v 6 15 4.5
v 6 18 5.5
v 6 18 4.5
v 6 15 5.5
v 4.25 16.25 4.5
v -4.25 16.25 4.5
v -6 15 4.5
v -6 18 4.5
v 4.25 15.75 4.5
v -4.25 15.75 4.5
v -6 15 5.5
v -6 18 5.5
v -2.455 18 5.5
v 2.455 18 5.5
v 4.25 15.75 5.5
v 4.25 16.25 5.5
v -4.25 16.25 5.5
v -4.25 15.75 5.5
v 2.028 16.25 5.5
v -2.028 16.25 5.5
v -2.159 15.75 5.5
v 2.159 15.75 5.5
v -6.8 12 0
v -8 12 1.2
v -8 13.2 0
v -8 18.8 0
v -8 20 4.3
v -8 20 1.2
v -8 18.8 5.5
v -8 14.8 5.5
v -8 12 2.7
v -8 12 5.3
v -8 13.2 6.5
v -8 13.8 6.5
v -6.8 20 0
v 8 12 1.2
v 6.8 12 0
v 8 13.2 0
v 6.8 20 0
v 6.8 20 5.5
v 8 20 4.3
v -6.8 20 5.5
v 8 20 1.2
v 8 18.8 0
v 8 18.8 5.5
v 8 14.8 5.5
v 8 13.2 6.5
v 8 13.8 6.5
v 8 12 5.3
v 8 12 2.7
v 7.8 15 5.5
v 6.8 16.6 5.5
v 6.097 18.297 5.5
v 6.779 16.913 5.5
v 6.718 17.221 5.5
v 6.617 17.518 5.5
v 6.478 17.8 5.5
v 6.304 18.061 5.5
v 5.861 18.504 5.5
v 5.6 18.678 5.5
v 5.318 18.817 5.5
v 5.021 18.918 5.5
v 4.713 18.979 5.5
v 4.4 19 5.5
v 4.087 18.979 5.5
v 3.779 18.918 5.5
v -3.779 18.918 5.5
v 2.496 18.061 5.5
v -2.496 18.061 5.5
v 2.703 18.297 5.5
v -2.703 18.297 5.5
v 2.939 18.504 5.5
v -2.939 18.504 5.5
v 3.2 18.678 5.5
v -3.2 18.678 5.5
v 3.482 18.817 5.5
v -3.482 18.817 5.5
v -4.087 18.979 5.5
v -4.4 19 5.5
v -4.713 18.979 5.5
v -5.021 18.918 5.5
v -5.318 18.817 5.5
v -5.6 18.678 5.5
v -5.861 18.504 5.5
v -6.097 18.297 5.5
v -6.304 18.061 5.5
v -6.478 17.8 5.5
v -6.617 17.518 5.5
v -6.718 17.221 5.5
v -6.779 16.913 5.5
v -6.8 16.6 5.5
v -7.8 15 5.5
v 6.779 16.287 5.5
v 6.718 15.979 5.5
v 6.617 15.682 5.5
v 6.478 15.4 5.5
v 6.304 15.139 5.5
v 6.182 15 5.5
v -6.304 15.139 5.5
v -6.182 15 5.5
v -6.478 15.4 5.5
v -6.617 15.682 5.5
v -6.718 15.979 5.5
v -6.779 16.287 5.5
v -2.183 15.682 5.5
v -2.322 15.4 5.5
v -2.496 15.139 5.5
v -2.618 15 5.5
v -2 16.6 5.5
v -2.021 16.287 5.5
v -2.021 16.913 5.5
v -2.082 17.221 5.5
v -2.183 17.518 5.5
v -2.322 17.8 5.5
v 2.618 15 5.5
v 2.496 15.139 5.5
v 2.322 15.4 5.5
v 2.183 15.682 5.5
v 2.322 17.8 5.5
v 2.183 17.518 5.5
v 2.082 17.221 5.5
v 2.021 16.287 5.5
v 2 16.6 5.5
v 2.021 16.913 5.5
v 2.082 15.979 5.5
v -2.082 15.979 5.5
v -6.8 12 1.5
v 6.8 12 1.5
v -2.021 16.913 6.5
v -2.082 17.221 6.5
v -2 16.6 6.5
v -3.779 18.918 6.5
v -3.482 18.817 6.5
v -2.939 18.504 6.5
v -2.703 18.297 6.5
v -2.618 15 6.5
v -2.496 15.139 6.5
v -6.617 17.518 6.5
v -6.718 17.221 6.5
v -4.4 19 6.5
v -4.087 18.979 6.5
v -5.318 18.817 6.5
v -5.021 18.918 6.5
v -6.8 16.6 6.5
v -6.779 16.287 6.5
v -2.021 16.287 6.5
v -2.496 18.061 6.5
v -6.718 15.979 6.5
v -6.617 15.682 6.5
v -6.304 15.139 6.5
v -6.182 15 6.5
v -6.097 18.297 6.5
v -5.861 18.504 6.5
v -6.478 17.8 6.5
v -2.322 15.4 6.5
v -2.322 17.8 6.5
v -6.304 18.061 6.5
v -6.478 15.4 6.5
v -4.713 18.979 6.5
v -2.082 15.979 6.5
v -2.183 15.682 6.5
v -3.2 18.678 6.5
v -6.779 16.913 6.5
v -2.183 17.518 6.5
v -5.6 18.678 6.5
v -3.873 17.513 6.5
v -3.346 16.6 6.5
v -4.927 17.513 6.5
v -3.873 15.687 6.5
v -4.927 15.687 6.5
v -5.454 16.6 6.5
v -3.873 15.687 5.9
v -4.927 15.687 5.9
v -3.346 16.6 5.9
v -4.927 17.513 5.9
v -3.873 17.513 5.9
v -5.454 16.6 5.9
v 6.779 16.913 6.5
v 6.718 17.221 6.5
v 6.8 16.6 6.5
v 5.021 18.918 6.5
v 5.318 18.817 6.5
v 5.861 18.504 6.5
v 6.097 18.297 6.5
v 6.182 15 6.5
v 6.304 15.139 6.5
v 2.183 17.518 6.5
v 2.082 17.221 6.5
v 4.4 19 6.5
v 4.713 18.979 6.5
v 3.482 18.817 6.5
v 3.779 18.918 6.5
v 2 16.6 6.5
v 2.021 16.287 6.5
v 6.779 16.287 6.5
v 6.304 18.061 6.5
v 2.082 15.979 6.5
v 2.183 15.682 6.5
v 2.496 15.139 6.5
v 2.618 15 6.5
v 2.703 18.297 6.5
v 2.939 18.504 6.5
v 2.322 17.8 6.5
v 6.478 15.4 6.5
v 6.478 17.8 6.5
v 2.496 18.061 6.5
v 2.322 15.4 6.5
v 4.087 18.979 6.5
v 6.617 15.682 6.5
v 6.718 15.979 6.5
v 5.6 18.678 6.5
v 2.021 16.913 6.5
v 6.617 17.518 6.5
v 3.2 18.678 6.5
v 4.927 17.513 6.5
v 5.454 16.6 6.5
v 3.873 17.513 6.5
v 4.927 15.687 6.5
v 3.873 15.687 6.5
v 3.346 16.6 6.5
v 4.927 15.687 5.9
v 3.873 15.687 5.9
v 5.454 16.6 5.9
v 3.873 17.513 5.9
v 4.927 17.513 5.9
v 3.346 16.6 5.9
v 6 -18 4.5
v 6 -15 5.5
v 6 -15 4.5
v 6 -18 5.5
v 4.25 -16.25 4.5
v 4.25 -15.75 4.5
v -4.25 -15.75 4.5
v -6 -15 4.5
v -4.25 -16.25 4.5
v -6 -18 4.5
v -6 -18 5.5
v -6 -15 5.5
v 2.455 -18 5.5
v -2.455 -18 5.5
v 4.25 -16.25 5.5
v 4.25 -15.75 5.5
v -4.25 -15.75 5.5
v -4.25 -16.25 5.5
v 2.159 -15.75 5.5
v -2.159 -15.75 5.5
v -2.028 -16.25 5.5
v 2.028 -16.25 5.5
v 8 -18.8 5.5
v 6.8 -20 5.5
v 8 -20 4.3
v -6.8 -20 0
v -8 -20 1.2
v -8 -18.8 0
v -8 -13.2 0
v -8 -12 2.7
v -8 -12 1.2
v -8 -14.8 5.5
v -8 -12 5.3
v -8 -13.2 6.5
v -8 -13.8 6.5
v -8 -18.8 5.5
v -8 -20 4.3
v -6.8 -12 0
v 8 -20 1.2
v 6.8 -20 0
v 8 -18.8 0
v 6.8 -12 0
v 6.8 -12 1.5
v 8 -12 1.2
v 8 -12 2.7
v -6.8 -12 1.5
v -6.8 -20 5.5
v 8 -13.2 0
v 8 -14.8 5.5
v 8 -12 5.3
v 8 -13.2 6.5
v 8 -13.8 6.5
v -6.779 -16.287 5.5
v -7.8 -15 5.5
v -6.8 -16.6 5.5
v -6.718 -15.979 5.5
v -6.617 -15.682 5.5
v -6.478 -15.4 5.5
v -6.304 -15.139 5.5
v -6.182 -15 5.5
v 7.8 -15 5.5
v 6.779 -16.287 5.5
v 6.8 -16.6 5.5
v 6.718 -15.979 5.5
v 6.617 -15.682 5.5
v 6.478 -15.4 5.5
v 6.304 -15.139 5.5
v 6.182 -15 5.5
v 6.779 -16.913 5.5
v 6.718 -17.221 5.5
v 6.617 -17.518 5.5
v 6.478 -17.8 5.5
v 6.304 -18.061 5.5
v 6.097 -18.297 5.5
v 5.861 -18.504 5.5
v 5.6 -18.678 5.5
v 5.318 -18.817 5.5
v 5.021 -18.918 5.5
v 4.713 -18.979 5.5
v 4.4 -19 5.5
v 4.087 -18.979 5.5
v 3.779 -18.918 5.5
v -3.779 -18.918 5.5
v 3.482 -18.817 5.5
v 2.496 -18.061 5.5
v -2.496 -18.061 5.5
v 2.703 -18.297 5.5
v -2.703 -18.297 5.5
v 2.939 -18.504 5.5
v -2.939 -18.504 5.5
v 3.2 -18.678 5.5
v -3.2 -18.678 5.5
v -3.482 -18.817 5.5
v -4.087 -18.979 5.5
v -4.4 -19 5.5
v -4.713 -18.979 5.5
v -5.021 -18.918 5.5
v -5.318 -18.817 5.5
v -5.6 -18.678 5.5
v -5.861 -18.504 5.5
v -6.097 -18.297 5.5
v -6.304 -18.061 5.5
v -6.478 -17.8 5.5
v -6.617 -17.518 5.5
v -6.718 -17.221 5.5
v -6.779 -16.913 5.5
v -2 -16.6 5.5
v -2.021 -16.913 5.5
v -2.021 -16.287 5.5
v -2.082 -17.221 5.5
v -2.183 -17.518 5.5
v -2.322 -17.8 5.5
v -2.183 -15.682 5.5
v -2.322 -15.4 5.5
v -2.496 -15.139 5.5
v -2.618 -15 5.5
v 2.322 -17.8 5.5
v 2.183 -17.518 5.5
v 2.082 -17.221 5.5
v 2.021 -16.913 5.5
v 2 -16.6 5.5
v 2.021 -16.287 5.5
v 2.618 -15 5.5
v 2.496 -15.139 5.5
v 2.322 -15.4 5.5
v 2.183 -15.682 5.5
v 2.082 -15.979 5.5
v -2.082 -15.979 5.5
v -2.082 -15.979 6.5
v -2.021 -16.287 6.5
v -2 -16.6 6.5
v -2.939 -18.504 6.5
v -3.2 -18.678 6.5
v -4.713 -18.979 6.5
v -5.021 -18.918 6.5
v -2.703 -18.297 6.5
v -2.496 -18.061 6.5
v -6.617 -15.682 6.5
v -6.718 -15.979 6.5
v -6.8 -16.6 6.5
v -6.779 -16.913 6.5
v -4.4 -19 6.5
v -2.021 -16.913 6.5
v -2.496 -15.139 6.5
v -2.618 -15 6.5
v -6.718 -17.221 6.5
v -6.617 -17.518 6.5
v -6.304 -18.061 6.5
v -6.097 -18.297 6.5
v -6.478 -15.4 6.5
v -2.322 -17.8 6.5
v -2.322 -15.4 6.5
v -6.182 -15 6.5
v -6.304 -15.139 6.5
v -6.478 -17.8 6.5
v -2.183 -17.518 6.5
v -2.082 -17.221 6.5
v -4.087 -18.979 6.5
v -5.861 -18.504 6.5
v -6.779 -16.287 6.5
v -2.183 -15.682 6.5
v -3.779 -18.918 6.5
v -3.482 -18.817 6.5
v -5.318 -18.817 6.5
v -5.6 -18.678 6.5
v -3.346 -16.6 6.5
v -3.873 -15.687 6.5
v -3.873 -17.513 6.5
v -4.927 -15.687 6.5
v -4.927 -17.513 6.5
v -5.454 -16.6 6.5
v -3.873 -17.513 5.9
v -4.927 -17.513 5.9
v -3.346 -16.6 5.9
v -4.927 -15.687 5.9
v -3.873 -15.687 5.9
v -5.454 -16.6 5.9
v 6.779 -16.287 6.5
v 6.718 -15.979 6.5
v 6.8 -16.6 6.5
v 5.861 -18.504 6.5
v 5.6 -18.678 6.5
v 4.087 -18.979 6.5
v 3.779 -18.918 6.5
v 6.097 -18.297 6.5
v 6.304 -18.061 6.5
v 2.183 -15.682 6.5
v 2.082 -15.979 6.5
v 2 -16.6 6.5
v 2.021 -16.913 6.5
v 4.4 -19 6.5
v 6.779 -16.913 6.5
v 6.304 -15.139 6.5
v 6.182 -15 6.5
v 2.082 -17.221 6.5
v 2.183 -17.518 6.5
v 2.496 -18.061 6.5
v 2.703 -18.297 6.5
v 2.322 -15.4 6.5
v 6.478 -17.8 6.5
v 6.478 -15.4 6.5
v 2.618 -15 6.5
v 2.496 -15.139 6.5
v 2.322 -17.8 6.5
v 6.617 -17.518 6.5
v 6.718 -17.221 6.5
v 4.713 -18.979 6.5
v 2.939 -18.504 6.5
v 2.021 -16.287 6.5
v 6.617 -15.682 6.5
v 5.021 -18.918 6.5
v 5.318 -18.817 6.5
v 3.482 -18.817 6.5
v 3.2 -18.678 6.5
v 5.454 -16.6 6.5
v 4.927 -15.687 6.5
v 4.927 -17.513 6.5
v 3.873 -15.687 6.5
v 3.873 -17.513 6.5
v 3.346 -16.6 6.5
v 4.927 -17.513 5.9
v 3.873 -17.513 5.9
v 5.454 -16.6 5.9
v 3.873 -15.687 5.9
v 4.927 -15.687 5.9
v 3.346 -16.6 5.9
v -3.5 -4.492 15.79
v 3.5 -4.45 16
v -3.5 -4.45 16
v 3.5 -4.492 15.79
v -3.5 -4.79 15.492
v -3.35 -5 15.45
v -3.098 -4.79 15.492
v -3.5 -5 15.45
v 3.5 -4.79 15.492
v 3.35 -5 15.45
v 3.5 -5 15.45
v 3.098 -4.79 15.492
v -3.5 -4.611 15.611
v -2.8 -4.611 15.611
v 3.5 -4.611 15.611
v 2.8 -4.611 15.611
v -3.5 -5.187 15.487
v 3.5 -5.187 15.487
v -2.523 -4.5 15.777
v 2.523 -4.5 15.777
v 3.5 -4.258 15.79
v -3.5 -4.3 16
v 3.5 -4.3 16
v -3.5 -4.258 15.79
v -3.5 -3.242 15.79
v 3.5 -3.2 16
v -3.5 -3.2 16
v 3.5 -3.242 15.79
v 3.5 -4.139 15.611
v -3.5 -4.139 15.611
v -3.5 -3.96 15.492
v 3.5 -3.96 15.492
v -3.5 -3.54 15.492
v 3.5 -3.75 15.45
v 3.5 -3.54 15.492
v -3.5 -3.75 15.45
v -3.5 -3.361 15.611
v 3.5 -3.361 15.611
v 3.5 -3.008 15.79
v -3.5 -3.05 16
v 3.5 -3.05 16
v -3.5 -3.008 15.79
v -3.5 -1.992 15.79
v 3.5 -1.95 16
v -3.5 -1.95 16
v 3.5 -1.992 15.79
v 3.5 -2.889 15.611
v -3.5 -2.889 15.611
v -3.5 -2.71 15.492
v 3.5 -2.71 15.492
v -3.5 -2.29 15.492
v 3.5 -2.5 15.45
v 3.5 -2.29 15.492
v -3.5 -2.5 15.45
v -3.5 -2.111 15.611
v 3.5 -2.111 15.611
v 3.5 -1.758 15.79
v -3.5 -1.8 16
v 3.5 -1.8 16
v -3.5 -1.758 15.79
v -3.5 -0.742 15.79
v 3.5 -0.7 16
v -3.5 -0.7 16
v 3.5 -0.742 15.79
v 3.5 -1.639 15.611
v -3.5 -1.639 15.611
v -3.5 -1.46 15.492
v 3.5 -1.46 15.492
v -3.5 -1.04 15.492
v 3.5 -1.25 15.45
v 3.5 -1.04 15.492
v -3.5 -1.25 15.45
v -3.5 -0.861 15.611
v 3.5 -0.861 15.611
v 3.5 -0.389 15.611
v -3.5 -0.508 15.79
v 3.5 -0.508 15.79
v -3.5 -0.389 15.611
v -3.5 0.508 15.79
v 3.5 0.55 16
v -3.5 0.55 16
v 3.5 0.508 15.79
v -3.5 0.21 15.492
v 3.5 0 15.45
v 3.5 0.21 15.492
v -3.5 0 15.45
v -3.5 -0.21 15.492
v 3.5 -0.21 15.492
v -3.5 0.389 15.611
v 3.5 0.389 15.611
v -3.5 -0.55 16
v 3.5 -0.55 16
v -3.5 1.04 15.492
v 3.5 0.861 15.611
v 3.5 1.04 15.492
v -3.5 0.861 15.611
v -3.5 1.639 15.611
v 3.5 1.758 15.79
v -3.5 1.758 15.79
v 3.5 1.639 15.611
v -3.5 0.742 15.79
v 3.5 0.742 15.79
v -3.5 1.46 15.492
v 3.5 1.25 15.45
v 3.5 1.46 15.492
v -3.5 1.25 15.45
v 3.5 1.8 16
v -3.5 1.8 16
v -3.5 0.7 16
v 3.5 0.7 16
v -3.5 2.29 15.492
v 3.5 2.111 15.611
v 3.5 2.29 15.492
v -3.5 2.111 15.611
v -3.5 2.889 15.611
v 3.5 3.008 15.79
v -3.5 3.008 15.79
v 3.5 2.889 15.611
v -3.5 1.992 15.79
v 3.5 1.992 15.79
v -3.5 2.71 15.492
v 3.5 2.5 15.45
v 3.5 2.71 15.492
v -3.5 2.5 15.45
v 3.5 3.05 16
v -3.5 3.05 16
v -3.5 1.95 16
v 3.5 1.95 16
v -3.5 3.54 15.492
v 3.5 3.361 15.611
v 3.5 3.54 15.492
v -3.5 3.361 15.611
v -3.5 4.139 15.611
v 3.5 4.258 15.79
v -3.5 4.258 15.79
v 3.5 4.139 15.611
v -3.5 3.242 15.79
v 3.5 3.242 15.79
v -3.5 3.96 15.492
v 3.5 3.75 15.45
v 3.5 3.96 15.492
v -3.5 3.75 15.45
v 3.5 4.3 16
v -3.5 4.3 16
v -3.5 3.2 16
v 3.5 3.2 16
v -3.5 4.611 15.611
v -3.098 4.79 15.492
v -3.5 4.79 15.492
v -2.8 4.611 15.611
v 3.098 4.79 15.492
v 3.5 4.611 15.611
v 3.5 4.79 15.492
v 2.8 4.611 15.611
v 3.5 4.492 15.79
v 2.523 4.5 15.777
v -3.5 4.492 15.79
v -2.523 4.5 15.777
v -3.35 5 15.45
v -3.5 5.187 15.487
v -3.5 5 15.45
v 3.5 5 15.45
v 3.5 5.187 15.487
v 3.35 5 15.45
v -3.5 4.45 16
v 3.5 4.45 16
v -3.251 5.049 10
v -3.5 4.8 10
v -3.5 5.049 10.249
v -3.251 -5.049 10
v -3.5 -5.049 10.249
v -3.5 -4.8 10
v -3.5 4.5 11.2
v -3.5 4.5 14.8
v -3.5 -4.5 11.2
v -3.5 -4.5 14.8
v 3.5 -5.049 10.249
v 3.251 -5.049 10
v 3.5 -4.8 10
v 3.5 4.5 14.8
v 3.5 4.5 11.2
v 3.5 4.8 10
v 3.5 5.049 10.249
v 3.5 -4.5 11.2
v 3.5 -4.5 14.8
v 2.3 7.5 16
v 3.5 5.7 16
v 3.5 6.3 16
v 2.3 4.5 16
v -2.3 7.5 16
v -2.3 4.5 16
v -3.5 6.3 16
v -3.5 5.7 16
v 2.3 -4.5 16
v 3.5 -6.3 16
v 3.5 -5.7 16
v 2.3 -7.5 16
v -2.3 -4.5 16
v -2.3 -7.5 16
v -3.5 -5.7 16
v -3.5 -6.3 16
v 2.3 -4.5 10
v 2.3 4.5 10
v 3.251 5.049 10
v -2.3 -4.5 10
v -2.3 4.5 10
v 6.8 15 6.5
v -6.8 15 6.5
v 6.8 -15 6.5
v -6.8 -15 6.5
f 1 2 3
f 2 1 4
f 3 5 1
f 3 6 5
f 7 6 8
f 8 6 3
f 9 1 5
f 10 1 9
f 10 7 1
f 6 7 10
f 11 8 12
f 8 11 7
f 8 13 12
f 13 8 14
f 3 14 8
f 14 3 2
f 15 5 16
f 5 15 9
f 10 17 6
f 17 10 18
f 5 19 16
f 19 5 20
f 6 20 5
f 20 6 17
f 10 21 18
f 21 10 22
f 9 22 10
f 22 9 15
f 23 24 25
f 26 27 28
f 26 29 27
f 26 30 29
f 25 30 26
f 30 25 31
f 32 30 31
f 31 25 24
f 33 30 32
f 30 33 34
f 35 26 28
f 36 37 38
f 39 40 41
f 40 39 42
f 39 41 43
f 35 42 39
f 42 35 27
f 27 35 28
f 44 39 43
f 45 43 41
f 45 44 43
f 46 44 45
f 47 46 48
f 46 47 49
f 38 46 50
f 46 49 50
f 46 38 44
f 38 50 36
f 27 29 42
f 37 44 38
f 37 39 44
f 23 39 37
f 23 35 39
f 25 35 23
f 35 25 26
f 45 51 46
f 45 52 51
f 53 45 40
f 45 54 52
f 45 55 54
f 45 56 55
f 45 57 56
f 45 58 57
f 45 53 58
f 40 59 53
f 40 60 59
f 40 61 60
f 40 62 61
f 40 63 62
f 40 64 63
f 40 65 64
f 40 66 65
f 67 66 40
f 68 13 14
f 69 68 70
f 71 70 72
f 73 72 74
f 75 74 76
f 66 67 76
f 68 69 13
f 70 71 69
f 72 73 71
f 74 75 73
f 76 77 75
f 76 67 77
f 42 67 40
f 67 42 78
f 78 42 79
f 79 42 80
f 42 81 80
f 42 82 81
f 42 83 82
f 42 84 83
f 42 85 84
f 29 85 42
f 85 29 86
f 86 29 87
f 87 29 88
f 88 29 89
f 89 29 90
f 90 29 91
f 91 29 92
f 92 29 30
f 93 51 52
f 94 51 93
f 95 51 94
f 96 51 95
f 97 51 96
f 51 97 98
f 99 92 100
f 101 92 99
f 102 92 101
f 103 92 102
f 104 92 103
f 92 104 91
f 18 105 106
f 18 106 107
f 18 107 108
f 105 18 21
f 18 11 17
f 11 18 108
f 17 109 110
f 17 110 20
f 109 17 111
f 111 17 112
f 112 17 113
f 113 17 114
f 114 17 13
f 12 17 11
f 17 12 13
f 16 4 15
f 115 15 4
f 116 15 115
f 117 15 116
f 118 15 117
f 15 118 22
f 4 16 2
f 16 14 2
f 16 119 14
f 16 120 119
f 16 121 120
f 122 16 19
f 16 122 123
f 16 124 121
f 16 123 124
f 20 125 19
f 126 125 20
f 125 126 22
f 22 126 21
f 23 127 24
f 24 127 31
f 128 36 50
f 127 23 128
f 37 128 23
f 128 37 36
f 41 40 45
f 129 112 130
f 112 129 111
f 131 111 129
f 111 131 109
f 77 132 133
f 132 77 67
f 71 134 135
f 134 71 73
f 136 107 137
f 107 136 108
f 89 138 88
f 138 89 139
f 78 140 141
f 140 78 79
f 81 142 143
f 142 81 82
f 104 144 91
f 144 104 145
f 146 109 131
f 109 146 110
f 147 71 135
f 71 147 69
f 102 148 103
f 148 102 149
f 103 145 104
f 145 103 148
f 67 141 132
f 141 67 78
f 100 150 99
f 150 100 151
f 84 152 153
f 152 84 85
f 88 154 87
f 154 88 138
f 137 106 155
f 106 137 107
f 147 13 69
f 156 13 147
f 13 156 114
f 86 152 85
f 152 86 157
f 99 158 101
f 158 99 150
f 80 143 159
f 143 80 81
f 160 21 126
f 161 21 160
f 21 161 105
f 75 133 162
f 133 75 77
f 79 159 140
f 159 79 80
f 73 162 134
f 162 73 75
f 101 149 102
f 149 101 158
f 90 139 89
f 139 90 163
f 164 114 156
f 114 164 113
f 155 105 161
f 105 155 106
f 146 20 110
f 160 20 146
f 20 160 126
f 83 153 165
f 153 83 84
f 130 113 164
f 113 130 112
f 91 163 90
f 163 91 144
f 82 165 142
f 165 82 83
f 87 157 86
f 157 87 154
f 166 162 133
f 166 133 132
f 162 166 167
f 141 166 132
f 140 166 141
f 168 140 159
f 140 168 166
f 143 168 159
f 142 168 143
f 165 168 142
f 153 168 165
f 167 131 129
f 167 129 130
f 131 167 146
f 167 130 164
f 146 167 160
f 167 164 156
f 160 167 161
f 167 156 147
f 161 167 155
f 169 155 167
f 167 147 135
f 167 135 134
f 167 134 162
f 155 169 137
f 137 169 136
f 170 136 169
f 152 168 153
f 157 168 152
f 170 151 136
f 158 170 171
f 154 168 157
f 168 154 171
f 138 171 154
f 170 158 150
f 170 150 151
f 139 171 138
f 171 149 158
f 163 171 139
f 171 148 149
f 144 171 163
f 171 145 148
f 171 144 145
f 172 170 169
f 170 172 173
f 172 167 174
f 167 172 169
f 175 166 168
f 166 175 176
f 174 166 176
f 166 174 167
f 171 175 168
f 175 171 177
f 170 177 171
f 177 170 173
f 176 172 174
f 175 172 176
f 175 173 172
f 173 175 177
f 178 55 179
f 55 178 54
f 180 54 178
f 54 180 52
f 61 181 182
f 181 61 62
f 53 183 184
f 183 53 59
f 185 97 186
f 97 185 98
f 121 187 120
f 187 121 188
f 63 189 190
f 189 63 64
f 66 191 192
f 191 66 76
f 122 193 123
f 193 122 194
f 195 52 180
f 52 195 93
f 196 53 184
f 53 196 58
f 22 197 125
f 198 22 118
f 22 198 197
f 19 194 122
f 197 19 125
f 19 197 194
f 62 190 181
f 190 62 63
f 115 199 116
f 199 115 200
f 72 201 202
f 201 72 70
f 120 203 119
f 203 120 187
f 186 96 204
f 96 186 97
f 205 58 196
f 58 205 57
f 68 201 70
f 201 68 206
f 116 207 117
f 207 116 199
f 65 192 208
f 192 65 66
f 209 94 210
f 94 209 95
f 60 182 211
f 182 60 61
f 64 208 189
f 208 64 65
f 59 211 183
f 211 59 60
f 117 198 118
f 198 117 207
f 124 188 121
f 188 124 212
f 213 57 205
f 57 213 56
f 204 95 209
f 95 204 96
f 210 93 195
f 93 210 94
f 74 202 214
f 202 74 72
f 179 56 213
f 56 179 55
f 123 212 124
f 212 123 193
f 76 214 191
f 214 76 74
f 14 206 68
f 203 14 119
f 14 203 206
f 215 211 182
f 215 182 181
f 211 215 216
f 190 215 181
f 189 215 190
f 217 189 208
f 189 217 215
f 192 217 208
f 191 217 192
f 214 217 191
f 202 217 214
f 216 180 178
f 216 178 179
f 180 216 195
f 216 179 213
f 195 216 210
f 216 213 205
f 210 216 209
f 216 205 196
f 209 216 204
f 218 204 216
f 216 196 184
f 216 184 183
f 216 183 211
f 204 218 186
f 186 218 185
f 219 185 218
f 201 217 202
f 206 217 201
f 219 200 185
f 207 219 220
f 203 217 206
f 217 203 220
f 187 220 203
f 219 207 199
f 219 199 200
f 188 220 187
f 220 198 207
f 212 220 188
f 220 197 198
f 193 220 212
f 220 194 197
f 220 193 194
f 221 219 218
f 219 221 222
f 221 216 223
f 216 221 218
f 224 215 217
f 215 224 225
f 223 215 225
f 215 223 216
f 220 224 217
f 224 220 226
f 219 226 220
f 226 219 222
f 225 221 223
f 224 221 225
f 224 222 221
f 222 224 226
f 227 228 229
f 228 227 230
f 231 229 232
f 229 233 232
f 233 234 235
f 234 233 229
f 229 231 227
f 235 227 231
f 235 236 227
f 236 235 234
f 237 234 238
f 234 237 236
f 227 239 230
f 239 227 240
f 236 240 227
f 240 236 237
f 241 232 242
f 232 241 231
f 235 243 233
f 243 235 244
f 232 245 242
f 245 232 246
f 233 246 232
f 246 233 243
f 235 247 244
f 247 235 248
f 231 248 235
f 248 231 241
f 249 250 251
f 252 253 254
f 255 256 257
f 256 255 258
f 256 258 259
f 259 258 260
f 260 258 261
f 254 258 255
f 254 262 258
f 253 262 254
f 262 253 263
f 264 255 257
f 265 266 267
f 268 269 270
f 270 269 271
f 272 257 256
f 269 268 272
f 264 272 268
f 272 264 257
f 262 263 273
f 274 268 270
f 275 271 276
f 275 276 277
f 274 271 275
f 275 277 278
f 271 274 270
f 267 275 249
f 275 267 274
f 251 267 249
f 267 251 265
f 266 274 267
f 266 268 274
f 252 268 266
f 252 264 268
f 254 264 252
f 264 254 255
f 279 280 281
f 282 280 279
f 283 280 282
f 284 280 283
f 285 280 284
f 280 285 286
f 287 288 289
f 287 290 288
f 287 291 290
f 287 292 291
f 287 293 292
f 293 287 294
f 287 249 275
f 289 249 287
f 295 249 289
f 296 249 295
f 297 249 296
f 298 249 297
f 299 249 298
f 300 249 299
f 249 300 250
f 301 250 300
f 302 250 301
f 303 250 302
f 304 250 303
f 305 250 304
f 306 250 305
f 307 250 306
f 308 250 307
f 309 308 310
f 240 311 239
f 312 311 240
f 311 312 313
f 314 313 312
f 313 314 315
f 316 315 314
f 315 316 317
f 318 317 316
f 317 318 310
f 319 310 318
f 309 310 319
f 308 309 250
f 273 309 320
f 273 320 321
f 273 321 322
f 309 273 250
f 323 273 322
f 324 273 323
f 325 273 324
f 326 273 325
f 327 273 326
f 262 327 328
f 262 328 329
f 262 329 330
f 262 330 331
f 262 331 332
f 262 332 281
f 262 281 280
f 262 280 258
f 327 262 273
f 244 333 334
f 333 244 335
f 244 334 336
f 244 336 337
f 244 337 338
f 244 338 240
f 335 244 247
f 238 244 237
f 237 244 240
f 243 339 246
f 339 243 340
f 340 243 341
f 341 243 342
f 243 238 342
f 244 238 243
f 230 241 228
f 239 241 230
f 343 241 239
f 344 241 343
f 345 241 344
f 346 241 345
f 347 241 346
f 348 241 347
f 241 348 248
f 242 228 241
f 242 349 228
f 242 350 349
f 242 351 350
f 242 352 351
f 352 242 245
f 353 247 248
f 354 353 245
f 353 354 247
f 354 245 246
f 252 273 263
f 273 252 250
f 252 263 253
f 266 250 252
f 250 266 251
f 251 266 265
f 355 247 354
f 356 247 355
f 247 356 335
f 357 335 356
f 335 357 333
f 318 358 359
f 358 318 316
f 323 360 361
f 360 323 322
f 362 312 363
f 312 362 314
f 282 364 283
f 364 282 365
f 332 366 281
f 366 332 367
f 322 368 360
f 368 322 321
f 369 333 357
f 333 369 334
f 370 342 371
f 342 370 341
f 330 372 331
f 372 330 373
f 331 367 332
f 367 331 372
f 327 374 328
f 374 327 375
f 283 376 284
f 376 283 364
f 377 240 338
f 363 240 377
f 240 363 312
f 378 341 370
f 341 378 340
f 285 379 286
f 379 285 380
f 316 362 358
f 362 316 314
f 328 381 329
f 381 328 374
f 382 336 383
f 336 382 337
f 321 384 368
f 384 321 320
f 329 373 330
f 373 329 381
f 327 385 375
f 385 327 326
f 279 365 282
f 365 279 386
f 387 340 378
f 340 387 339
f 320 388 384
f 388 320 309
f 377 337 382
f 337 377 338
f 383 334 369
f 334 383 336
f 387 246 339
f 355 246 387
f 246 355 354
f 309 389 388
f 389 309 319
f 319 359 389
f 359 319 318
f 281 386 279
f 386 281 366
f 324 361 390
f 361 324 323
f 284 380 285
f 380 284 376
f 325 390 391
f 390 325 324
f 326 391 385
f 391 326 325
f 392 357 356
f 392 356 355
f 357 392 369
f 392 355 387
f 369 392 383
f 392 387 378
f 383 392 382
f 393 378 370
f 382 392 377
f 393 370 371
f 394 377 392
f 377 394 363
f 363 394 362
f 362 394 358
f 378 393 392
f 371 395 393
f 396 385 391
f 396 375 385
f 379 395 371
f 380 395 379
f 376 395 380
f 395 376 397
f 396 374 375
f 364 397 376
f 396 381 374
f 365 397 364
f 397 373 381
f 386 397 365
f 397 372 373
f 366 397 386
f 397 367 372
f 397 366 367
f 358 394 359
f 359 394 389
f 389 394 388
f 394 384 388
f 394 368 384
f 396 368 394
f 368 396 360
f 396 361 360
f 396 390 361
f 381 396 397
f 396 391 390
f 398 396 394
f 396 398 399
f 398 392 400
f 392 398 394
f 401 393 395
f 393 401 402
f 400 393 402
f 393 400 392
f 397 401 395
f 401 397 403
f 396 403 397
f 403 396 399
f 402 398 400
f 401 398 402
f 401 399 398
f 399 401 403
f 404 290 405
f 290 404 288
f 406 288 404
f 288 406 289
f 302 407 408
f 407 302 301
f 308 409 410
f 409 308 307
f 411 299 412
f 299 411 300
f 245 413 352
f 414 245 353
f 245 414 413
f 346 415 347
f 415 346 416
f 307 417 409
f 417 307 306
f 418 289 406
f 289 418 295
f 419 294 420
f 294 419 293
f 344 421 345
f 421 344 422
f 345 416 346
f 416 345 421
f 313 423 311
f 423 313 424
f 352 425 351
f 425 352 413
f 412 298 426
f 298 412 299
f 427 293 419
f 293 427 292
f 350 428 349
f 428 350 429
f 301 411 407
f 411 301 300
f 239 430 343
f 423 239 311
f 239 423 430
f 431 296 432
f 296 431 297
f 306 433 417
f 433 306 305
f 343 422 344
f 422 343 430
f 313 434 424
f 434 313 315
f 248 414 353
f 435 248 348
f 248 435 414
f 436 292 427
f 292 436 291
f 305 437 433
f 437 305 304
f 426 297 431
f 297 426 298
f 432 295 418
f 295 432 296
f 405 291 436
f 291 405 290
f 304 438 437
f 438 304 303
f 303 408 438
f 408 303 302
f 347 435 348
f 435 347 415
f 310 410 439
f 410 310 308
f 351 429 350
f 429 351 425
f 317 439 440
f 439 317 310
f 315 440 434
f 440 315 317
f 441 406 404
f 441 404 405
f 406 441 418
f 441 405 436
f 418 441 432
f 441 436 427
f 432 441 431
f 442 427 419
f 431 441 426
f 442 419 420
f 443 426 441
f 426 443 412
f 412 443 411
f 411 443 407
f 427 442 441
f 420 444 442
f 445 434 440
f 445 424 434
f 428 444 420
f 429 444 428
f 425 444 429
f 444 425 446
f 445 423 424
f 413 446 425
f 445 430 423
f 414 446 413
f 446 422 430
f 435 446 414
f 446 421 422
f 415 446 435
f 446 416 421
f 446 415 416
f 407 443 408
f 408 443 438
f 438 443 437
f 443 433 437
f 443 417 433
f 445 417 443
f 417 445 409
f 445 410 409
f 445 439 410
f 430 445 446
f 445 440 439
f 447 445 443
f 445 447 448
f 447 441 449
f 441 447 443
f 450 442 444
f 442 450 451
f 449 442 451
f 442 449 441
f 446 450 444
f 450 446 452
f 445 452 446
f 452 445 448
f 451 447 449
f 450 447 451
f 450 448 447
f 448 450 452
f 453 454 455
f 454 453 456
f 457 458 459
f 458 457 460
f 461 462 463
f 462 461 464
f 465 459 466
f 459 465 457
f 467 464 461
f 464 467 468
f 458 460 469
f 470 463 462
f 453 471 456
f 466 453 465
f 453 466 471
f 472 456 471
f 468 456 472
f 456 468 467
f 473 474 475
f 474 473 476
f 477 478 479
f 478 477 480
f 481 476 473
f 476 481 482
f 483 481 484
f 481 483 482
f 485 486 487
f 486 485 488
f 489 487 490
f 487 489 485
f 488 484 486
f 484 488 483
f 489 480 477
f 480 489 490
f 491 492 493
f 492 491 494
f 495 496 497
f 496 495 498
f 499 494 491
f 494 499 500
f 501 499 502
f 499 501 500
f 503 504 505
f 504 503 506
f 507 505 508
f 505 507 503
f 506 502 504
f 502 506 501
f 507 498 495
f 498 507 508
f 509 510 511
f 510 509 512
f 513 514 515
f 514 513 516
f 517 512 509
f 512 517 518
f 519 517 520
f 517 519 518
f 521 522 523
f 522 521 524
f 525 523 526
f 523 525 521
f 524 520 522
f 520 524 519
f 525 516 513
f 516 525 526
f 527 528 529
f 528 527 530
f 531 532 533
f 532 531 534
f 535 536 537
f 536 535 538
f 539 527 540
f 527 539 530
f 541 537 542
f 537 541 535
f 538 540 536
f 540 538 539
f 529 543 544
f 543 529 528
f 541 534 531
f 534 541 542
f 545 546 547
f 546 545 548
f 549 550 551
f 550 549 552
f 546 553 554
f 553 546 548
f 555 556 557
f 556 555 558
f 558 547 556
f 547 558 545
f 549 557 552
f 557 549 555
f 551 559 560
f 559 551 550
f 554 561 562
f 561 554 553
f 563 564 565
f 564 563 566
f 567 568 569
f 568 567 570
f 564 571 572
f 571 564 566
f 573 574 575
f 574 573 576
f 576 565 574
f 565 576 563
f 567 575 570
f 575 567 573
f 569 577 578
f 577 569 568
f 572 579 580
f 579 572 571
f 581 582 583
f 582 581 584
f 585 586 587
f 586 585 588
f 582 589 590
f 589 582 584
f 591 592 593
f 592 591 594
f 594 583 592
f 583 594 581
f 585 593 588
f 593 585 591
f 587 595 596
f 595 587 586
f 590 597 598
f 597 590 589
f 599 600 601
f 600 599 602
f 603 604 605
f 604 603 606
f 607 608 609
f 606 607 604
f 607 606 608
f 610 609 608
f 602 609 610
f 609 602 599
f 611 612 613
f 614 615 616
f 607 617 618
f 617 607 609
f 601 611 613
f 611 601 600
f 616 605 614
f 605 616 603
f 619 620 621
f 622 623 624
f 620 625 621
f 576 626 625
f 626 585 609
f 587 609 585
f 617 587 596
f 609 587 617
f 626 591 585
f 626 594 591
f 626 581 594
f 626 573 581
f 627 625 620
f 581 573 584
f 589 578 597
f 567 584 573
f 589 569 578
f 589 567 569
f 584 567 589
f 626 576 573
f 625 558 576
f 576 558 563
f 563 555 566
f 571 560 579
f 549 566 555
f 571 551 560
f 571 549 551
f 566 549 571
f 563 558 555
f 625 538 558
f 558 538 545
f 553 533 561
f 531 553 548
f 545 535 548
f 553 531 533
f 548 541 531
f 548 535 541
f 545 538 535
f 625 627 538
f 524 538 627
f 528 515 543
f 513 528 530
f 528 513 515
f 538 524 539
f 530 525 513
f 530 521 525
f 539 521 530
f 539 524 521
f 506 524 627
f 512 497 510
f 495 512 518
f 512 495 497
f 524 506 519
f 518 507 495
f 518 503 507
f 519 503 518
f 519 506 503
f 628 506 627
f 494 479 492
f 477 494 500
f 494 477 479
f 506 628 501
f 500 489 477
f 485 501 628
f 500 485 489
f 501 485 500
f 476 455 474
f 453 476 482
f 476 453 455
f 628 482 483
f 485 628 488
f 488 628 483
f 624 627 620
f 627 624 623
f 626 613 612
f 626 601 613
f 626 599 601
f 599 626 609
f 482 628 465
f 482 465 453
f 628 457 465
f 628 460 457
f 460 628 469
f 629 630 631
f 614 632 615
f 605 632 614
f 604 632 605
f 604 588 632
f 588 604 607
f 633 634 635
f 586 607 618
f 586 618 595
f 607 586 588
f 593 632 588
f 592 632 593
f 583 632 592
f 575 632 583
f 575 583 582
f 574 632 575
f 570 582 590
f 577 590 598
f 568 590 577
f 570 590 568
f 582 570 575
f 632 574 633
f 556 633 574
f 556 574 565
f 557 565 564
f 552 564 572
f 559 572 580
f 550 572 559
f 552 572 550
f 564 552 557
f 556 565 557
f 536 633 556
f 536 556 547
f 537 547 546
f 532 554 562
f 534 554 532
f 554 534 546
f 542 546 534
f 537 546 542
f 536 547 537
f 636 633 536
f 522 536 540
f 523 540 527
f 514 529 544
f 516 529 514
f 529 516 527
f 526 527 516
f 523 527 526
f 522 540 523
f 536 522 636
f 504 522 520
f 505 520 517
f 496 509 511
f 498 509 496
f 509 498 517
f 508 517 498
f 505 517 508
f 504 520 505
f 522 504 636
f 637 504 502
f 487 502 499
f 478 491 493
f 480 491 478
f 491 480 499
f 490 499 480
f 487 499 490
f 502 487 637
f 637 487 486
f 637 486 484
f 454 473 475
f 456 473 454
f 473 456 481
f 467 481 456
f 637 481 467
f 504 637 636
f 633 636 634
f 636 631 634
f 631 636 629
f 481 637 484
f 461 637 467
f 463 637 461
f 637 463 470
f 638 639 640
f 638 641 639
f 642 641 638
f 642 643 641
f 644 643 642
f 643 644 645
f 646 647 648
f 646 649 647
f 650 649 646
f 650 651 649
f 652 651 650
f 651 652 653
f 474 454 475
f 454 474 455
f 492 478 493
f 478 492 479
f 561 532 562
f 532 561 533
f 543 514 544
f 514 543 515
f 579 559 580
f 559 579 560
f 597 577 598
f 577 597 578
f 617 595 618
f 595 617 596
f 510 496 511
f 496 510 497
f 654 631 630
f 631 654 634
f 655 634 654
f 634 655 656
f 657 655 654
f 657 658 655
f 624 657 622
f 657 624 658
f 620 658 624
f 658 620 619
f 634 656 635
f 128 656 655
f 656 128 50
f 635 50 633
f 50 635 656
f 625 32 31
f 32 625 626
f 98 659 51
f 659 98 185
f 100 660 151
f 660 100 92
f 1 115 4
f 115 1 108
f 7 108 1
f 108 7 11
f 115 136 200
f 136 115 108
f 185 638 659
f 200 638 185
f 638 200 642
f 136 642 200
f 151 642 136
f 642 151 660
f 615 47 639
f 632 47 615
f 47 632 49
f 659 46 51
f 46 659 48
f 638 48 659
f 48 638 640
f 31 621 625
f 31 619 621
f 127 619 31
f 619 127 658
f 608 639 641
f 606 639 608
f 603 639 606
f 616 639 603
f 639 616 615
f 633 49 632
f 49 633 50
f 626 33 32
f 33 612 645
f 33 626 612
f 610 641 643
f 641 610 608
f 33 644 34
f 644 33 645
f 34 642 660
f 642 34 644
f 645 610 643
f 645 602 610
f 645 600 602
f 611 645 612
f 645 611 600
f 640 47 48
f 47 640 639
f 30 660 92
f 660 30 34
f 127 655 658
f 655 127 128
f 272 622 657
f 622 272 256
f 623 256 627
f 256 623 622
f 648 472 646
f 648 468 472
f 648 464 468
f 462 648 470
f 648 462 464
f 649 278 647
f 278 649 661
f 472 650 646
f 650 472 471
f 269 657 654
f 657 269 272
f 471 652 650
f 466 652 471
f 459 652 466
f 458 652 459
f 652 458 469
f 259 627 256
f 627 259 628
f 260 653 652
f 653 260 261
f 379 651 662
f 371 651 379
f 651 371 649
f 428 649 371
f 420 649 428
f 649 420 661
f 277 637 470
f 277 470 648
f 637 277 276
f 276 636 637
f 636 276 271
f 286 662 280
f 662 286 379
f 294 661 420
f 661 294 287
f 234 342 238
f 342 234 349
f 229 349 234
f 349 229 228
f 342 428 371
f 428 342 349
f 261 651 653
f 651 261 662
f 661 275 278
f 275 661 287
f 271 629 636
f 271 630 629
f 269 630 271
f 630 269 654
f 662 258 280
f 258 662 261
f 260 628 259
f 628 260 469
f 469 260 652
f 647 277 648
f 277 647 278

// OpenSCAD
// Console10 — sci-fi grab handle (parametric module), v4
// ----------------------------------------------------------------------------
// Dog-bone genre handle: wide angular END BLOCKS, diagonal tapers, a thin ribbed
// SPINE raised on ramp-arms with open finger space behind it. Faux bolts are
// DECORATIVE surface detail only (no holes) — the handle is printed as part of
// the host model, so there's nothing to fasten. Original geometry, genre-inspired.
//
// Mount face = z=0; handle stands toward +z; long axis = Y. Defaults are sized to
// sit flush across a 41.5 mm Gridfinity bin side. `use <>` this from an assembly.
// ----------------------------------------------------------------------------

module scifi_handle(
  L        = 40,    // overall length (Y) — set to the side it mounts flush across
  W        = 16,    // end-block width (X)
  SW       = 7,     // spine width (the thin middle)
  BLK      = 8,     // end-block length (each end)
  bh       = 5.5,   // end-block height off the mount
  TAP      = 6,     // diagonal taper run (block -> spine)
  standoff = 13,    // spine-centre height off the mount (finger gap below it)
  sw_t     = 6,     // spine thickness (z)
  cham     = 1.2,   // hard-surface chamfer
  bolt_d   = 3.4,   // faux bolt head diameter
  ribs     = 9,     // rib count
  rib_d    = 1.1,   // rib groove cutter dia
  bolts    = true,  // decorative bolts on/off
  fn       = 48
) {
  $fn = fn;
  spine_hy = L/2 - BLK - TAP;        // half-length of the straight spine
  rib_span = max(4, 2*spine_hy - 2);

  module cbox(l, w, h, c) {          // crisp chamfered box (45-deg bevels)
    hull() {
      cube([l - 2*c, w,        h       ], center = true);
      cube([l,        w - 2*c, h       ], center = true);
      cube([l,        w,        h - 2*c], center = true);
    }
  }
  module bolt() {                    // decorative washer pad + hex socket (no through-hole)
    difference() {
      cylinder(d = bolt_d + 1.4, h = 1.0);
      translate([0, 0, 0.4]) cylinder(d = bolt_d * 0.62, h = 1.0, $fn = 6);
    }
  }
  module block(s) {
    yc = s * (L/2 - BLK/2);
    difference() {
      translate([0, yc, bh/2]) cbox(W, BLK, bh, cham);
      translate([0, yc, bh - 0.4]) difference() {     // recessed panel border
        cube([W - 4,   BLK - 4,   1.2], center = true);
        cube([W - 7.5, BLK - 7.5, 3.0], center = true);
      }
    }
    if (bolts) for (sx = [-1, 1])
      translate([sx * (W/2 - 3.6), s * (L/2 - 3.4), bh]) bolt();
  }
  module arm(s) {                    // diagonal ramp: block (W, low) -> spine (SW, raised)
    hull() {
      translate([0, s * (L/2 - BLK + 1.5), bh - 1.5]) cbox(W,  3, 5,    cham);
      translate([0, s * spine_hy,          standoff]) cbox(SW, 3, sw_t, cham);
    }
  }
  module spine() {
    difference() {
      translate([0, 0, standoff]) cbox(SW, 2 * spine_hy, sw_t, cham);
      for (i = [0 : ribs - 1]) {
        y = -rib_span/2 + i * (rib_span / (ribs - 1));
        translate([0, y, standoff + sw_t/2]) rotate([0, 90, 0])
          cylinder(d = rib_d, h = SW + 2, center = true, $fn = 16);
      }
    }
  }
  block(1); block(-1); arm(1); arm(-1); spine();
}

scifi_handle();   // standalone preview (ignored when this file is `use`d)
